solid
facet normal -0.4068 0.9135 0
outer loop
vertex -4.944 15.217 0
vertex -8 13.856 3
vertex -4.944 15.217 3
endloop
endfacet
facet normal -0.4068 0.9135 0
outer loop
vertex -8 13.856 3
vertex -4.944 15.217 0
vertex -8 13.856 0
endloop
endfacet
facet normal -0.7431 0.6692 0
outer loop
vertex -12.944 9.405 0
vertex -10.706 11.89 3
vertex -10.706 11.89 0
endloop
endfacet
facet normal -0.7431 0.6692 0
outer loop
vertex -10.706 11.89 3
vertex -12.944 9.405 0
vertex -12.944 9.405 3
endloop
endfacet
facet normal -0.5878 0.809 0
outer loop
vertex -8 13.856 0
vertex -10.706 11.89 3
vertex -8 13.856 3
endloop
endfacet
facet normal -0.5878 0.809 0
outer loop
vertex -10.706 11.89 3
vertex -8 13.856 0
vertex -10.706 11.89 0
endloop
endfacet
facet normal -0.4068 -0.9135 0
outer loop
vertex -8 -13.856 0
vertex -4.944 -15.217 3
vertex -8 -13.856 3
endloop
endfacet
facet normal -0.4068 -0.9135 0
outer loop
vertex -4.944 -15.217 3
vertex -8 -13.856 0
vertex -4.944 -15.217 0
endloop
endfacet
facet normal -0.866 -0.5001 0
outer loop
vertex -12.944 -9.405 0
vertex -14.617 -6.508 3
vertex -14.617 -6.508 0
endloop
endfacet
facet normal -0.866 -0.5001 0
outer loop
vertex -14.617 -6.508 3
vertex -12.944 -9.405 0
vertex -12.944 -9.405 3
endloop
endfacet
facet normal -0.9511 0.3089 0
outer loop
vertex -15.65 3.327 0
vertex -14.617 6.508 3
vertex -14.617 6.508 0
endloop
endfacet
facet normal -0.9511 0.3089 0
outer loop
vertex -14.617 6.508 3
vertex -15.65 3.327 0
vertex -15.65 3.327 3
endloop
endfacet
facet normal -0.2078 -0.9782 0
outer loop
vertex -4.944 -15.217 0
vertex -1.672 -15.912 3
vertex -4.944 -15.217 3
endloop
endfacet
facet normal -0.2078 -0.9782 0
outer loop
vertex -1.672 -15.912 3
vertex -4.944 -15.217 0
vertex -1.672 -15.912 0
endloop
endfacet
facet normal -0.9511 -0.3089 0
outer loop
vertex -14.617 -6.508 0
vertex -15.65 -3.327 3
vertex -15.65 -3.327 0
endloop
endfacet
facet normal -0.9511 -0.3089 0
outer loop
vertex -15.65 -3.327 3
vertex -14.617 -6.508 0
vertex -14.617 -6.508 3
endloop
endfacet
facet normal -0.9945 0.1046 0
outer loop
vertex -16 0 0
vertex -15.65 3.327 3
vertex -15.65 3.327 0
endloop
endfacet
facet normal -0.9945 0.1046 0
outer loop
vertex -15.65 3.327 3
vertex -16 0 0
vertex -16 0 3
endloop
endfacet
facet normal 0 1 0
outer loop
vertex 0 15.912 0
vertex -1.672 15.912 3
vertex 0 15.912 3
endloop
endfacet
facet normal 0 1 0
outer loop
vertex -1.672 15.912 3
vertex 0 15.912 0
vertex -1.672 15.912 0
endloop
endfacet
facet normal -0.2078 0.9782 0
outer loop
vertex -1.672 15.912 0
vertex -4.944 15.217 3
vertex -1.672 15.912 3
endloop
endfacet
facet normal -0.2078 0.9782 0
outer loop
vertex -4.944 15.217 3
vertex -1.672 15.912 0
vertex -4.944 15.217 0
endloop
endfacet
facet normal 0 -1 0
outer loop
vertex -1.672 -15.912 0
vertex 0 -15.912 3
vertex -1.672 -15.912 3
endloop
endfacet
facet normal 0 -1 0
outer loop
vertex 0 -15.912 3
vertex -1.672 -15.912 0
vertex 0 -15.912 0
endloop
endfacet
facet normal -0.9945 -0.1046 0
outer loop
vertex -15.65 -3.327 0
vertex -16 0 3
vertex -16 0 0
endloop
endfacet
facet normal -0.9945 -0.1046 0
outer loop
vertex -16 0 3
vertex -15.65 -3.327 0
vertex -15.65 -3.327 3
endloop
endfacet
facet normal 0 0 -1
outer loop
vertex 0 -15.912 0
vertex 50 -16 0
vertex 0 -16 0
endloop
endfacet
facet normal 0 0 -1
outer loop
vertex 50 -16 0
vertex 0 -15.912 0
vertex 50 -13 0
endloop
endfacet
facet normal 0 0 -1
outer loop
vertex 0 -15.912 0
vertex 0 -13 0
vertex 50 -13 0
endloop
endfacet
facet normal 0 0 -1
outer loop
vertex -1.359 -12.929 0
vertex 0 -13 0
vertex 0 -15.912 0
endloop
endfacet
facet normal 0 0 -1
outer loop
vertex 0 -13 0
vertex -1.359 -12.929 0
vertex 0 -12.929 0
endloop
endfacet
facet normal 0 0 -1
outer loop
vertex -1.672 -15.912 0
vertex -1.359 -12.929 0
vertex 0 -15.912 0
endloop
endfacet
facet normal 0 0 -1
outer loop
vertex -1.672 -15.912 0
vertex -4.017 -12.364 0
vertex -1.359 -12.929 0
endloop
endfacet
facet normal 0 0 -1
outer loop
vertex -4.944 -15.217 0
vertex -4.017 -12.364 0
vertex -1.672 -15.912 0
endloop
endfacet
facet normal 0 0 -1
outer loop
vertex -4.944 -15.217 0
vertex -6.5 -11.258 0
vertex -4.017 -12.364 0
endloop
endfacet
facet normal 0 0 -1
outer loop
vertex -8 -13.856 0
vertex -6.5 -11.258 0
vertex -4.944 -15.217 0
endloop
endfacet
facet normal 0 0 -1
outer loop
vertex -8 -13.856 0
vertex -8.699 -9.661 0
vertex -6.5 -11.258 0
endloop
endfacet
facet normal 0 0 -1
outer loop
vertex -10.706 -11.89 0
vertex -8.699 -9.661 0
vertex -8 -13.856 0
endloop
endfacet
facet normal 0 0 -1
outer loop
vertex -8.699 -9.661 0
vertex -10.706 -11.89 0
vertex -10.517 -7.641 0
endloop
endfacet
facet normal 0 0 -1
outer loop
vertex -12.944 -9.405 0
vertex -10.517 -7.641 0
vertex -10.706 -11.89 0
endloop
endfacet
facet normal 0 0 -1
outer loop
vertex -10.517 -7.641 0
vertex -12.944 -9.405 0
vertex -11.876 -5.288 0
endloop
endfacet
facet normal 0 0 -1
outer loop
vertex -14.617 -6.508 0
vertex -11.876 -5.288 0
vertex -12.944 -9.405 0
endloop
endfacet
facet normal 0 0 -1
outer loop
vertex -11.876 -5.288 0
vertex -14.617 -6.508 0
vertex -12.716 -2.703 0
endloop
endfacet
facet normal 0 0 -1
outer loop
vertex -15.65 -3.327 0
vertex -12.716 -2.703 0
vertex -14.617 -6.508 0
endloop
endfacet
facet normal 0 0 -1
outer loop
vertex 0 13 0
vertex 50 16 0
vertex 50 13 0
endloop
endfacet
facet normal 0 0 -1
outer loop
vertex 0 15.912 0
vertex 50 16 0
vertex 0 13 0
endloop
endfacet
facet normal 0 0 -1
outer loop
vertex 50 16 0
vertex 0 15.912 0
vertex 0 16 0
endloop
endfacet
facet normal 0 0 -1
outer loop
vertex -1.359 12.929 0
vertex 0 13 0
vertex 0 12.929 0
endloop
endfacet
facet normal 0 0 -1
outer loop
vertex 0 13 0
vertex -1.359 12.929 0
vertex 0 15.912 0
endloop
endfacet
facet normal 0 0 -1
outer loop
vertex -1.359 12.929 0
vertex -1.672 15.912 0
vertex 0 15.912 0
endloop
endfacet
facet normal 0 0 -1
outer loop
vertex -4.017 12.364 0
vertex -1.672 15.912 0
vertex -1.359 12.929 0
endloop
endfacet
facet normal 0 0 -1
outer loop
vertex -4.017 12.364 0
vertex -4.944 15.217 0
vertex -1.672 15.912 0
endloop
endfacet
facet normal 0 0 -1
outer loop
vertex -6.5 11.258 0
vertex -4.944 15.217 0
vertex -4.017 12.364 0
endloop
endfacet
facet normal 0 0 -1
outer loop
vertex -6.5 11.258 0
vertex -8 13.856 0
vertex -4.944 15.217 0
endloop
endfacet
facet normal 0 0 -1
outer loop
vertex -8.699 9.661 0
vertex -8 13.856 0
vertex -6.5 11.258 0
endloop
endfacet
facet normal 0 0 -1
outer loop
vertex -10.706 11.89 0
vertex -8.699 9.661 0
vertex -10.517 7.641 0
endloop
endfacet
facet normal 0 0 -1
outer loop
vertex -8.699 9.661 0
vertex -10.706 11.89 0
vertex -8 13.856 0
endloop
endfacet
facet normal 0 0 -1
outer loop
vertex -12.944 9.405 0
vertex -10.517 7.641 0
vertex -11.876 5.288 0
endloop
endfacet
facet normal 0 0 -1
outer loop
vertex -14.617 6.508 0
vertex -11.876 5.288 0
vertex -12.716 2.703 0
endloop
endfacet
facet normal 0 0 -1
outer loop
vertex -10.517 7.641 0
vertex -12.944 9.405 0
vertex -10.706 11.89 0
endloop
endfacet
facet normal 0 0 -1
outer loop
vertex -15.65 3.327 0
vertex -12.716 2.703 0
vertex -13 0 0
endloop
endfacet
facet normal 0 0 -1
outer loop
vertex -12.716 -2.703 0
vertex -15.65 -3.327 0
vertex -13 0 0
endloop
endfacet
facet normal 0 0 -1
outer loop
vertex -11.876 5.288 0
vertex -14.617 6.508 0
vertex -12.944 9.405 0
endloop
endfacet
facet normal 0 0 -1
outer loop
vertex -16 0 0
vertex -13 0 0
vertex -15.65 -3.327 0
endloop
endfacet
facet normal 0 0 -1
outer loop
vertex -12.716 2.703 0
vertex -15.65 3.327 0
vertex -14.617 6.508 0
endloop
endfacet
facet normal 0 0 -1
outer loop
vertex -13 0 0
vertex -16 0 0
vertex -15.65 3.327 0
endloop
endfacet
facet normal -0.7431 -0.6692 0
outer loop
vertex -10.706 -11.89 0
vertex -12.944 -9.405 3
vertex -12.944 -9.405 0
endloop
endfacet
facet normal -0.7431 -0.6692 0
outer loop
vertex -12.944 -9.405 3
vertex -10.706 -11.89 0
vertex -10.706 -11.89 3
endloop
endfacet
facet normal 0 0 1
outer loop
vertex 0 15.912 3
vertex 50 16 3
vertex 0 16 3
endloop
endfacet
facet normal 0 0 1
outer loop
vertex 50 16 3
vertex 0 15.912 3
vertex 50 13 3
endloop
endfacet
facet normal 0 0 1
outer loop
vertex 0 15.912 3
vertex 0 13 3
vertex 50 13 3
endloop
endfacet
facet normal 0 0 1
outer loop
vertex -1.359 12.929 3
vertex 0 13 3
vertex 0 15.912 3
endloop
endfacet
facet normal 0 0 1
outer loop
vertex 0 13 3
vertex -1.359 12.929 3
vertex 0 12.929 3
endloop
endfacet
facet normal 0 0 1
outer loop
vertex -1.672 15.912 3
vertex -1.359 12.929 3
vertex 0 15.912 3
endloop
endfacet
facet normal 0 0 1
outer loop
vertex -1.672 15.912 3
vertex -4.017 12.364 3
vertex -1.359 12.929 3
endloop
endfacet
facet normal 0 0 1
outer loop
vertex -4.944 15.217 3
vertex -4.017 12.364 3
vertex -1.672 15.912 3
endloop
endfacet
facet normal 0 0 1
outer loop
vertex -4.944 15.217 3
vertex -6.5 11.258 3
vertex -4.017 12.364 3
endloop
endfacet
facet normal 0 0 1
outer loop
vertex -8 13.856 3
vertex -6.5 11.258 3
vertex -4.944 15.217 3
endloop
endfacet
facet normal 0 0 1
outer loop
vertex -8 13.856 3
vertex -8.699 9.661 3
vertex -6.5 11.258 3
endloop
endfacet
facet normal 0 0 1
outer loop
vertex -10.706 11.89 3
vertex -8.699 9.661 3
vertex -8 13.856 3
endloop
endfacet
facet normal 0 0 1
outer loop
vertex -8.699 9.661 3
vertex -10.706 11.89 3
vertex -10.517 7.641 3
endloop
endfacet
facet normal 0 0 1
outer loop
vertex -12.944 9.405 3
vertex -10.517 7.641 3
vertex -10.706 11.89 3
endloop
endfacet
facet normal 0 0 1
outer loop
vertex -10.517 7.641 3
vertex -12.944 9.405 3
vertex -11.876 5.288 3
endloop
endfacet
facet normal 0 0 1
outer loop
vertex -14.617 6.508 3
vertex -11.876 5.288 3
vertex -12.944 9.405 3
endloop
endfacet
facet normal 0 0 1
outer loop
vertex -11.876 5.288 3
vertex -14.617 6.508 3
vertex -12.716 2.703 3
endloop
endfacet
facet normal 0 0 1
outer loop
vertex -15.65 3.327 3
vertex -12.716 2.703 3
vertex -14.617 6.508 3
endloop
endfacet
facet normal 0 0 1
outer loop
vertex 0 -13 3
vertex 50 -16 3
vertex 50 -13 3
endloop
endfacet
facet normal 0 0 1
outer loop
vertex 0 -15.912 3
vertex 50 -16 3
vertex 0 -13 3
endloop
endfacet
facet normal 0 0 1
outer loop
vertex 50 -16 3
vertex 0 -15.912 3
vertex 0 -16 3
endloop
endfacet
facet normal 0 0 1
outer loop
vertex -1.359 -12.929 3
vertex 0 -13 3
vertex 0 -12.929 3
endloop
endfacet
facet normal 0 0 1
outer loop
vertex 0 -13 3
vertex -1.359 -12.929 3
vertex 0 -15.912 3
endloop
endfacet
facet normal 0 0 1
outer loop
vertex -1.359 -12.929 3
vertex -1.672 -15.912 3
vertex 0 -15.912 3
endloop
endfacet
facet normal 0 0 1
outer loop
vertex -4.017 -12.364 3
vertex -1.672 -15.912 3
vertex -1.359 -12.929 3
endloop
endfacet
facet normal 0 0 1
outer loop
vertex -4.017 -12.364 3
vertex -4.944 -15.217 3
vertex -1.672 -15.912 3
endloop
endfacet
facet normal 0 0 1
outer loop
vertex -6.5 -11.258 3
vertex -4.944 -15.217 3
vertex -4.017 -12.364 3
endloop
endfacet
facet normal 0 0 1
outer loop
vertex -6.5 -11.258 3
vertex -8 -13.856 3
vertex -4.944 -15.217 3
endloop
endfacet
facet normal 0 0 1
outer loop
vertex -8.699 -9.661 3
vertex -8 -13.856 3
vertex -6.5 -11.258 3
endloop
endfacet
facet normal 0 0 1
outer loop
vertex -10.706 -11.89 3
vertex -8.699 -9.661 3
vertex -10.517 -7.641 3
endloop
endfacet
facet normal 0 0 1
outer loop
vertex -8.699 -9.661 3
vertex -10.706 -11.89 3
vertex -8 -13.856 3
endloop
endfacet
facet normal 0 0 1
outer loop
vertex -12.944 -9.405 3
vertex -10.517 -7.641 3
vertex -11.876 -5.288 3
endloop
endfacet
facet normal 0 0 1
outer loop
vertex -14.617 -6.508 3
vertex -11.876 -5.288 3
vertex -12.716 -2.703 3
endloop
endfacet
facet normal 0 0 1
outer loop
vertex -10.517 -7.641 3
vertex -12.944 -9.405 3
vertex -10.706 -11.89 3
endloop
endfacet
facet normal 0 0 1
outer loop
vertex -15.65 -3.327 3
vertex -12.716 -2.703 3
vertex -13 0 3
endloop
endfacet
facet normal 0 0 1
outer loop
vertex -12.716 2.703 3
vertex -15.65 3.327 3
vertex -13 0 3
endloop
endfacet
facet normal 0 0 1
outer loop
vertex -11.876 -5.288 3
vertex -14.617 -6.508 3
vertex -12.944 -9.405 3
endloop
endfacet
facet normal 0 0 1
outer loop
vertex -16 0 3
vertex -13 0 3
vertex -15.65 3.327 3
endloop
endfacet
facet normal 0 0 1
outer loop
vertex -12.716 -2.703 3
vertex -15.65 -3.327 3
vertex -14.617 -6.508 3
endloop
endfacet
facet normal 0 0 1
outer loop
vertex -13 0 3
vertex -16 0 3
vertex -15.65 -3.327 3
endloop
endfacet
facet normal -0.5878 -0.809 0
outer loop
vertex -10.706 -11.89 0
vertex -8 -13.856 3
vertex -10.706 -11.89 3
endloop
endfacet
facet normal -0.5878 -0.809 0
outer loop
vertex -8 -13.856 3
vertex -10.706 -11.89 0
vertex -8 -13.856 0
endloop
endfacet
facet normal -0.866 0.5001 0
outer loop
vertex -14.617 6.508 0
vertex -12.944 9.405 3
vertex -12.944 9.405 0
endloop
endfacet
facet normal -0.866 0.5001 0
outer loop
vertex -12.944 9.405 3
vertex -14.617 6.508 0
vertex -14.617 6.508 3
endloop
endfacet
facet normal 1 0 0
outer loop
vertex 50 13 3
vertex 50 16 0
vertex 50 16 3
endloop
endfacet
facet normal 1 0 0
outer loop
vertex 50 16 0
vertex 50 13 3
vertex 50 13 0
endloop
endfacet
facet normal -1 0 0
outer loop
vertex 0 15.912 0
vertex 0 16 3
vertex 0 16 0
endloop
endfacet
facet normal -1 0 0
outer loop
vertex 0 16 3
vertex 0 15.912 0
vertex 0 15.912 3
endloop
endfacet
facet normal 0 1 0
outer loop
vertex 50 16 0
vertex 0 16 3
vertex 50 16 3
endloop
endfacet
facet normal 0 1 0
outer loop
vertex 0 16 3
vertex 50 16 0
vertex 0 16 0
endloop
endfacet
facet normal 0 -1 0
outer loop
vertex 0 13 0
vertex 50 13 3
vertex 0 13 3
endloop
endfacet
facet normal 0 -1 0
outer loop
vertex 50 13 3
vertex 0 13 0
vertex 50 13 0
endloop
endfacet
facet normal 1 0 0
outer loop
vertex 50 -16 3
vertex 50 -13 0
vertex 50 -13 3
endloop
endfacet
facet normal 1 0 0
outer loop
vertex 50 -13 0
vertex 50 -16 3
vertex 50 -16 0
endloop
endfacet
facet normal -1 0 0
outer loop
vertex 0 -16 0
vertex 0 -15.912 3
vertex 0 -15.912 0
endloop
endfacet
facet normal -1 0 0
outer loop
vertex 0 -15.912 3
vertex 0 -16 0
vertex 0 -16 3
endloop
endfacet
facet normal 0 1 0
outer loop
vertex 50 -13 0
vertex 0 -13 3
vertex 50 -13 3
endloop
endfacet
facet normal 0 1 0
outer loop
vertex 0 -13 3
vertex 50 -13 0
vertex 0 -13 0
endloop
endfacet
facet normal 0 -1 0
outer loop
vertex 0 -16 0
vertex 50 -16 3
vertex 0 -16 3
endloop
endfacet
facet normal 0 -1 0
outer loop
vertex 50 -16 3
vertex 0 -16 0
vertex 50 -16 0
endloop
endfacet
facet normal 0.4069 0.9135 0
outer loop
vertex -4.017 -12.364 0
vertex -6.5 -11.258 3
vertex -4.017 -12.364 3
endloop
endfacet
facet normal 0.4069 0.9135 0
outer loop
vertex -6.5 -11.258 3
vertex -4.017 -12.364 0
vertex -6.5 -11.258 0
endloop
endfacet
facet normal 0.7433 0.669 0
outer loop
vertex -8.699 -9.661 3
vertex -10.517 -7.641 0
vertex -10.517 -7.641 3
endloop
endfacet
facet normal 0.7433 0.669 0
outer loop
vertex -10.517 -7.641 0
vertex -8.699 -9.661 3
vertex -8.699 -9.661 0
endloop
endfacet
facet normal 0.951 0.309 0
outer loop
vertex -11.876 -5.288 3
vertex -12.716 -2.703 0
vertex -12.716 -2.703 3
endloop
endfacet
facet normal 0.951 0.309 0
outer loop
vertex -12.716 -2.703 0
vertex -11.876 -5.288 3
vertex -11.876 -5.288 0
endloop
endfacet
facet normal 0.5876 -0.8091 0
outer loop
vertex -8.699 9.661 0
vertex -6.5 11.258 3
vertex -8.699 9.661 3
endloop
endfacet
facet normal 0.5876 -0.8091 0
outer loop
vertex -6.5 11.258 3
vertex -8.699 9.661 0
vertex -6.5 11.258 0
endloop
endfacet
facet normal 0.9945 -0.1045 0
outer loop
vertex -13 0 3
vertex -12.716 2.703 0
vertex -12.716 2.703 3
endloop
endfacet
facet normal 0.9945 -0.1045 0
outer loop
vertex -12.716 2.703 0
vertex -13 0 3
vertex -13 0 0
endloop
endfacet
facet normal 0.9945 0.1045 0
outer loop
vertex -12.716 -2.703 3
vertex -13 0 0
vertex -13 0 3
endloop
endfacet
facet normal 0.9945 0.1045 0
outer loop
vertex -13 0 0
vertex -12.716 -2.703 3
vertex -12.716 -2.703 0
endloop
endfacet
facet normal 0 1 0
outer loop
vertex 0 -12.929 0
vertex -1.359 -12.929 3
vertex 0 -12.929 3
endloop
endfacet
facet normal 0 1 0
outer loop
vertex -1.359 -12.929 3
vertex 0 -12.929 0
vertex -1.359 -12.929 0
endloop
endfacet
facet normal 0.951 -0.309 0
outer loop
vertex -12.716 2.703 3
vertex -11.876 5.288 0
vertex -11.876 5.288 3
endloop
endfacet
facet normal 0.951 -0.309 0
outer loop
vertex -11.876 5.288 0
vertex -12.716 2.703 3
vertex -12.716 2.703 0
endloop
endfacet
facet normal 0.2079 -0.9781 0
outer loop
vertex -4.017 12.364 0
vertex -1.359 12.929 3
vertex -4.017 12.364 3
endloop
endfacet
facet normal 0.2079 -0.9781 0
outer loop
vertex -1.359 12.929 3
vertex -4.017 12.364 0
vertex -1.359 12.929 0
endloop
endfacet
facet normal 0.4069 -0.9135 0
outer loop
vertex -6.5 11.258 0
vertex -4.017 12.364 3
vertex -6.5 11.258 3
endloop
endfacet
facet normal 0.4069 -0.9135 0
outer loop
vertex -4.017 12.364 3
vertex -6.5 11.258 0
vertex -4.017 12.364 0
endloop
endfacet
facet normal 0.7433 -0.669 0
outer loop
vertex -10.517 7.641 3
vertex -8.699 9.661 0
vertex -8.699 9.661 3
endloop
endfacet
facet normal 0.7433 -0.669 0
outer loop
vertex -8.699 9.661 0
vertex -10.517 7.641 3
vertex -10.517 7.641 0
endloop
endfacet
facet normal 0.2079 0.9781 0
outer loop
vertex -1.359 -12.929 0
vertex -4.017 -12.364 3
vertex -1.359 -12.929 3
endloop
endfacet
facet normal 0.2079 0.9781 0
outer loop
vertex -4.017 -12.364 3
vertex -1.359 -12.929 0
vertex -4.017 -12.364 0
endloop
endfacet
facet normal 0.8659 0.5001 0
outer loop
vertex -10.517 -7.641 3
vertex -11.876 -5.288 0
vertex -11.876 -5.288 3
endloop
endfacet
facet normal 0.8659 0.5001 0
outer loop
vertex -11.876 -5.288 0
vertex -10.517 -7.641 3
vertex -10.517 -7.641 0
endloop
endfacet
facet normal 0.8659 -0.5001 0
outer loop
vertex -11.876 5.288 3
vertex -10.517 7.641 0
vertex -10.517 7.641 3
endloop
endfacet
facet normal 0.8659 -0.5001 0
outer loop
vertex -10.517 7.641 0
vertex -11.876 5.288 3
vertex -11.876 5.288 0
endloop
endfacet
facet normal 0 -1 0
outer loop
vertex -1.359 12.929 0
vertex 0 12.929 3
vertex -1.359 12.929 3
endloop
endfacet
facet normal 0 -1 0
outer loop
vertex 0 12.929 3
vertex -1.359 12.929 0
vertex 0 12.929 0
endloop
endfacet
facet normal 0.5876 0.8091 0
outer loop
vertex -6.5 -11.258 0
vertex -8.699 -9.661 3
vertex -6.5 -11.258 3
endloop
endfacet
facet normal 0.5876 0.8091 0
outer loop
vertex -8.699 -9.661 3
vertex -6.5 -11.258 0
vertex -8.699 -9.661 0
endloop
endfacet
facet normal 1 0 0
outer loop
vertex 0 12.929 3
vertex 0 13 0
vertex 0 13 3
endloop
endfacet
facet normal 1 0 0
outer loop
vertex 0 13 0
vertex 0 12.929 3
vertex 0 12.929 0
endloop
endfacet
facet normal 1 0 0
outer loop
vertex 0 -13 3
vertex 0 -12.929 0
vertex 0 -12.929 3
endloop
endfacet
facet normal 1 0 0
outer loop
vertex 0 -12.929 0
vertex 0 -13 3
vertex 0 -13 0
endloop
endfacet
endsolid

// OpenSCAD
difference(){
    union(){
        cylinder(3,16,16,[0,0,0]);
        translate([0,13,0]) cube([50,3,3]);
        translate([0,-16,0]) cube([50,3,3]);
    };
    union(){
        cylinder(3,13,13,[0,0,0]);
        translate([0,-13,0]) cube([50,26,3]);
    }
};
